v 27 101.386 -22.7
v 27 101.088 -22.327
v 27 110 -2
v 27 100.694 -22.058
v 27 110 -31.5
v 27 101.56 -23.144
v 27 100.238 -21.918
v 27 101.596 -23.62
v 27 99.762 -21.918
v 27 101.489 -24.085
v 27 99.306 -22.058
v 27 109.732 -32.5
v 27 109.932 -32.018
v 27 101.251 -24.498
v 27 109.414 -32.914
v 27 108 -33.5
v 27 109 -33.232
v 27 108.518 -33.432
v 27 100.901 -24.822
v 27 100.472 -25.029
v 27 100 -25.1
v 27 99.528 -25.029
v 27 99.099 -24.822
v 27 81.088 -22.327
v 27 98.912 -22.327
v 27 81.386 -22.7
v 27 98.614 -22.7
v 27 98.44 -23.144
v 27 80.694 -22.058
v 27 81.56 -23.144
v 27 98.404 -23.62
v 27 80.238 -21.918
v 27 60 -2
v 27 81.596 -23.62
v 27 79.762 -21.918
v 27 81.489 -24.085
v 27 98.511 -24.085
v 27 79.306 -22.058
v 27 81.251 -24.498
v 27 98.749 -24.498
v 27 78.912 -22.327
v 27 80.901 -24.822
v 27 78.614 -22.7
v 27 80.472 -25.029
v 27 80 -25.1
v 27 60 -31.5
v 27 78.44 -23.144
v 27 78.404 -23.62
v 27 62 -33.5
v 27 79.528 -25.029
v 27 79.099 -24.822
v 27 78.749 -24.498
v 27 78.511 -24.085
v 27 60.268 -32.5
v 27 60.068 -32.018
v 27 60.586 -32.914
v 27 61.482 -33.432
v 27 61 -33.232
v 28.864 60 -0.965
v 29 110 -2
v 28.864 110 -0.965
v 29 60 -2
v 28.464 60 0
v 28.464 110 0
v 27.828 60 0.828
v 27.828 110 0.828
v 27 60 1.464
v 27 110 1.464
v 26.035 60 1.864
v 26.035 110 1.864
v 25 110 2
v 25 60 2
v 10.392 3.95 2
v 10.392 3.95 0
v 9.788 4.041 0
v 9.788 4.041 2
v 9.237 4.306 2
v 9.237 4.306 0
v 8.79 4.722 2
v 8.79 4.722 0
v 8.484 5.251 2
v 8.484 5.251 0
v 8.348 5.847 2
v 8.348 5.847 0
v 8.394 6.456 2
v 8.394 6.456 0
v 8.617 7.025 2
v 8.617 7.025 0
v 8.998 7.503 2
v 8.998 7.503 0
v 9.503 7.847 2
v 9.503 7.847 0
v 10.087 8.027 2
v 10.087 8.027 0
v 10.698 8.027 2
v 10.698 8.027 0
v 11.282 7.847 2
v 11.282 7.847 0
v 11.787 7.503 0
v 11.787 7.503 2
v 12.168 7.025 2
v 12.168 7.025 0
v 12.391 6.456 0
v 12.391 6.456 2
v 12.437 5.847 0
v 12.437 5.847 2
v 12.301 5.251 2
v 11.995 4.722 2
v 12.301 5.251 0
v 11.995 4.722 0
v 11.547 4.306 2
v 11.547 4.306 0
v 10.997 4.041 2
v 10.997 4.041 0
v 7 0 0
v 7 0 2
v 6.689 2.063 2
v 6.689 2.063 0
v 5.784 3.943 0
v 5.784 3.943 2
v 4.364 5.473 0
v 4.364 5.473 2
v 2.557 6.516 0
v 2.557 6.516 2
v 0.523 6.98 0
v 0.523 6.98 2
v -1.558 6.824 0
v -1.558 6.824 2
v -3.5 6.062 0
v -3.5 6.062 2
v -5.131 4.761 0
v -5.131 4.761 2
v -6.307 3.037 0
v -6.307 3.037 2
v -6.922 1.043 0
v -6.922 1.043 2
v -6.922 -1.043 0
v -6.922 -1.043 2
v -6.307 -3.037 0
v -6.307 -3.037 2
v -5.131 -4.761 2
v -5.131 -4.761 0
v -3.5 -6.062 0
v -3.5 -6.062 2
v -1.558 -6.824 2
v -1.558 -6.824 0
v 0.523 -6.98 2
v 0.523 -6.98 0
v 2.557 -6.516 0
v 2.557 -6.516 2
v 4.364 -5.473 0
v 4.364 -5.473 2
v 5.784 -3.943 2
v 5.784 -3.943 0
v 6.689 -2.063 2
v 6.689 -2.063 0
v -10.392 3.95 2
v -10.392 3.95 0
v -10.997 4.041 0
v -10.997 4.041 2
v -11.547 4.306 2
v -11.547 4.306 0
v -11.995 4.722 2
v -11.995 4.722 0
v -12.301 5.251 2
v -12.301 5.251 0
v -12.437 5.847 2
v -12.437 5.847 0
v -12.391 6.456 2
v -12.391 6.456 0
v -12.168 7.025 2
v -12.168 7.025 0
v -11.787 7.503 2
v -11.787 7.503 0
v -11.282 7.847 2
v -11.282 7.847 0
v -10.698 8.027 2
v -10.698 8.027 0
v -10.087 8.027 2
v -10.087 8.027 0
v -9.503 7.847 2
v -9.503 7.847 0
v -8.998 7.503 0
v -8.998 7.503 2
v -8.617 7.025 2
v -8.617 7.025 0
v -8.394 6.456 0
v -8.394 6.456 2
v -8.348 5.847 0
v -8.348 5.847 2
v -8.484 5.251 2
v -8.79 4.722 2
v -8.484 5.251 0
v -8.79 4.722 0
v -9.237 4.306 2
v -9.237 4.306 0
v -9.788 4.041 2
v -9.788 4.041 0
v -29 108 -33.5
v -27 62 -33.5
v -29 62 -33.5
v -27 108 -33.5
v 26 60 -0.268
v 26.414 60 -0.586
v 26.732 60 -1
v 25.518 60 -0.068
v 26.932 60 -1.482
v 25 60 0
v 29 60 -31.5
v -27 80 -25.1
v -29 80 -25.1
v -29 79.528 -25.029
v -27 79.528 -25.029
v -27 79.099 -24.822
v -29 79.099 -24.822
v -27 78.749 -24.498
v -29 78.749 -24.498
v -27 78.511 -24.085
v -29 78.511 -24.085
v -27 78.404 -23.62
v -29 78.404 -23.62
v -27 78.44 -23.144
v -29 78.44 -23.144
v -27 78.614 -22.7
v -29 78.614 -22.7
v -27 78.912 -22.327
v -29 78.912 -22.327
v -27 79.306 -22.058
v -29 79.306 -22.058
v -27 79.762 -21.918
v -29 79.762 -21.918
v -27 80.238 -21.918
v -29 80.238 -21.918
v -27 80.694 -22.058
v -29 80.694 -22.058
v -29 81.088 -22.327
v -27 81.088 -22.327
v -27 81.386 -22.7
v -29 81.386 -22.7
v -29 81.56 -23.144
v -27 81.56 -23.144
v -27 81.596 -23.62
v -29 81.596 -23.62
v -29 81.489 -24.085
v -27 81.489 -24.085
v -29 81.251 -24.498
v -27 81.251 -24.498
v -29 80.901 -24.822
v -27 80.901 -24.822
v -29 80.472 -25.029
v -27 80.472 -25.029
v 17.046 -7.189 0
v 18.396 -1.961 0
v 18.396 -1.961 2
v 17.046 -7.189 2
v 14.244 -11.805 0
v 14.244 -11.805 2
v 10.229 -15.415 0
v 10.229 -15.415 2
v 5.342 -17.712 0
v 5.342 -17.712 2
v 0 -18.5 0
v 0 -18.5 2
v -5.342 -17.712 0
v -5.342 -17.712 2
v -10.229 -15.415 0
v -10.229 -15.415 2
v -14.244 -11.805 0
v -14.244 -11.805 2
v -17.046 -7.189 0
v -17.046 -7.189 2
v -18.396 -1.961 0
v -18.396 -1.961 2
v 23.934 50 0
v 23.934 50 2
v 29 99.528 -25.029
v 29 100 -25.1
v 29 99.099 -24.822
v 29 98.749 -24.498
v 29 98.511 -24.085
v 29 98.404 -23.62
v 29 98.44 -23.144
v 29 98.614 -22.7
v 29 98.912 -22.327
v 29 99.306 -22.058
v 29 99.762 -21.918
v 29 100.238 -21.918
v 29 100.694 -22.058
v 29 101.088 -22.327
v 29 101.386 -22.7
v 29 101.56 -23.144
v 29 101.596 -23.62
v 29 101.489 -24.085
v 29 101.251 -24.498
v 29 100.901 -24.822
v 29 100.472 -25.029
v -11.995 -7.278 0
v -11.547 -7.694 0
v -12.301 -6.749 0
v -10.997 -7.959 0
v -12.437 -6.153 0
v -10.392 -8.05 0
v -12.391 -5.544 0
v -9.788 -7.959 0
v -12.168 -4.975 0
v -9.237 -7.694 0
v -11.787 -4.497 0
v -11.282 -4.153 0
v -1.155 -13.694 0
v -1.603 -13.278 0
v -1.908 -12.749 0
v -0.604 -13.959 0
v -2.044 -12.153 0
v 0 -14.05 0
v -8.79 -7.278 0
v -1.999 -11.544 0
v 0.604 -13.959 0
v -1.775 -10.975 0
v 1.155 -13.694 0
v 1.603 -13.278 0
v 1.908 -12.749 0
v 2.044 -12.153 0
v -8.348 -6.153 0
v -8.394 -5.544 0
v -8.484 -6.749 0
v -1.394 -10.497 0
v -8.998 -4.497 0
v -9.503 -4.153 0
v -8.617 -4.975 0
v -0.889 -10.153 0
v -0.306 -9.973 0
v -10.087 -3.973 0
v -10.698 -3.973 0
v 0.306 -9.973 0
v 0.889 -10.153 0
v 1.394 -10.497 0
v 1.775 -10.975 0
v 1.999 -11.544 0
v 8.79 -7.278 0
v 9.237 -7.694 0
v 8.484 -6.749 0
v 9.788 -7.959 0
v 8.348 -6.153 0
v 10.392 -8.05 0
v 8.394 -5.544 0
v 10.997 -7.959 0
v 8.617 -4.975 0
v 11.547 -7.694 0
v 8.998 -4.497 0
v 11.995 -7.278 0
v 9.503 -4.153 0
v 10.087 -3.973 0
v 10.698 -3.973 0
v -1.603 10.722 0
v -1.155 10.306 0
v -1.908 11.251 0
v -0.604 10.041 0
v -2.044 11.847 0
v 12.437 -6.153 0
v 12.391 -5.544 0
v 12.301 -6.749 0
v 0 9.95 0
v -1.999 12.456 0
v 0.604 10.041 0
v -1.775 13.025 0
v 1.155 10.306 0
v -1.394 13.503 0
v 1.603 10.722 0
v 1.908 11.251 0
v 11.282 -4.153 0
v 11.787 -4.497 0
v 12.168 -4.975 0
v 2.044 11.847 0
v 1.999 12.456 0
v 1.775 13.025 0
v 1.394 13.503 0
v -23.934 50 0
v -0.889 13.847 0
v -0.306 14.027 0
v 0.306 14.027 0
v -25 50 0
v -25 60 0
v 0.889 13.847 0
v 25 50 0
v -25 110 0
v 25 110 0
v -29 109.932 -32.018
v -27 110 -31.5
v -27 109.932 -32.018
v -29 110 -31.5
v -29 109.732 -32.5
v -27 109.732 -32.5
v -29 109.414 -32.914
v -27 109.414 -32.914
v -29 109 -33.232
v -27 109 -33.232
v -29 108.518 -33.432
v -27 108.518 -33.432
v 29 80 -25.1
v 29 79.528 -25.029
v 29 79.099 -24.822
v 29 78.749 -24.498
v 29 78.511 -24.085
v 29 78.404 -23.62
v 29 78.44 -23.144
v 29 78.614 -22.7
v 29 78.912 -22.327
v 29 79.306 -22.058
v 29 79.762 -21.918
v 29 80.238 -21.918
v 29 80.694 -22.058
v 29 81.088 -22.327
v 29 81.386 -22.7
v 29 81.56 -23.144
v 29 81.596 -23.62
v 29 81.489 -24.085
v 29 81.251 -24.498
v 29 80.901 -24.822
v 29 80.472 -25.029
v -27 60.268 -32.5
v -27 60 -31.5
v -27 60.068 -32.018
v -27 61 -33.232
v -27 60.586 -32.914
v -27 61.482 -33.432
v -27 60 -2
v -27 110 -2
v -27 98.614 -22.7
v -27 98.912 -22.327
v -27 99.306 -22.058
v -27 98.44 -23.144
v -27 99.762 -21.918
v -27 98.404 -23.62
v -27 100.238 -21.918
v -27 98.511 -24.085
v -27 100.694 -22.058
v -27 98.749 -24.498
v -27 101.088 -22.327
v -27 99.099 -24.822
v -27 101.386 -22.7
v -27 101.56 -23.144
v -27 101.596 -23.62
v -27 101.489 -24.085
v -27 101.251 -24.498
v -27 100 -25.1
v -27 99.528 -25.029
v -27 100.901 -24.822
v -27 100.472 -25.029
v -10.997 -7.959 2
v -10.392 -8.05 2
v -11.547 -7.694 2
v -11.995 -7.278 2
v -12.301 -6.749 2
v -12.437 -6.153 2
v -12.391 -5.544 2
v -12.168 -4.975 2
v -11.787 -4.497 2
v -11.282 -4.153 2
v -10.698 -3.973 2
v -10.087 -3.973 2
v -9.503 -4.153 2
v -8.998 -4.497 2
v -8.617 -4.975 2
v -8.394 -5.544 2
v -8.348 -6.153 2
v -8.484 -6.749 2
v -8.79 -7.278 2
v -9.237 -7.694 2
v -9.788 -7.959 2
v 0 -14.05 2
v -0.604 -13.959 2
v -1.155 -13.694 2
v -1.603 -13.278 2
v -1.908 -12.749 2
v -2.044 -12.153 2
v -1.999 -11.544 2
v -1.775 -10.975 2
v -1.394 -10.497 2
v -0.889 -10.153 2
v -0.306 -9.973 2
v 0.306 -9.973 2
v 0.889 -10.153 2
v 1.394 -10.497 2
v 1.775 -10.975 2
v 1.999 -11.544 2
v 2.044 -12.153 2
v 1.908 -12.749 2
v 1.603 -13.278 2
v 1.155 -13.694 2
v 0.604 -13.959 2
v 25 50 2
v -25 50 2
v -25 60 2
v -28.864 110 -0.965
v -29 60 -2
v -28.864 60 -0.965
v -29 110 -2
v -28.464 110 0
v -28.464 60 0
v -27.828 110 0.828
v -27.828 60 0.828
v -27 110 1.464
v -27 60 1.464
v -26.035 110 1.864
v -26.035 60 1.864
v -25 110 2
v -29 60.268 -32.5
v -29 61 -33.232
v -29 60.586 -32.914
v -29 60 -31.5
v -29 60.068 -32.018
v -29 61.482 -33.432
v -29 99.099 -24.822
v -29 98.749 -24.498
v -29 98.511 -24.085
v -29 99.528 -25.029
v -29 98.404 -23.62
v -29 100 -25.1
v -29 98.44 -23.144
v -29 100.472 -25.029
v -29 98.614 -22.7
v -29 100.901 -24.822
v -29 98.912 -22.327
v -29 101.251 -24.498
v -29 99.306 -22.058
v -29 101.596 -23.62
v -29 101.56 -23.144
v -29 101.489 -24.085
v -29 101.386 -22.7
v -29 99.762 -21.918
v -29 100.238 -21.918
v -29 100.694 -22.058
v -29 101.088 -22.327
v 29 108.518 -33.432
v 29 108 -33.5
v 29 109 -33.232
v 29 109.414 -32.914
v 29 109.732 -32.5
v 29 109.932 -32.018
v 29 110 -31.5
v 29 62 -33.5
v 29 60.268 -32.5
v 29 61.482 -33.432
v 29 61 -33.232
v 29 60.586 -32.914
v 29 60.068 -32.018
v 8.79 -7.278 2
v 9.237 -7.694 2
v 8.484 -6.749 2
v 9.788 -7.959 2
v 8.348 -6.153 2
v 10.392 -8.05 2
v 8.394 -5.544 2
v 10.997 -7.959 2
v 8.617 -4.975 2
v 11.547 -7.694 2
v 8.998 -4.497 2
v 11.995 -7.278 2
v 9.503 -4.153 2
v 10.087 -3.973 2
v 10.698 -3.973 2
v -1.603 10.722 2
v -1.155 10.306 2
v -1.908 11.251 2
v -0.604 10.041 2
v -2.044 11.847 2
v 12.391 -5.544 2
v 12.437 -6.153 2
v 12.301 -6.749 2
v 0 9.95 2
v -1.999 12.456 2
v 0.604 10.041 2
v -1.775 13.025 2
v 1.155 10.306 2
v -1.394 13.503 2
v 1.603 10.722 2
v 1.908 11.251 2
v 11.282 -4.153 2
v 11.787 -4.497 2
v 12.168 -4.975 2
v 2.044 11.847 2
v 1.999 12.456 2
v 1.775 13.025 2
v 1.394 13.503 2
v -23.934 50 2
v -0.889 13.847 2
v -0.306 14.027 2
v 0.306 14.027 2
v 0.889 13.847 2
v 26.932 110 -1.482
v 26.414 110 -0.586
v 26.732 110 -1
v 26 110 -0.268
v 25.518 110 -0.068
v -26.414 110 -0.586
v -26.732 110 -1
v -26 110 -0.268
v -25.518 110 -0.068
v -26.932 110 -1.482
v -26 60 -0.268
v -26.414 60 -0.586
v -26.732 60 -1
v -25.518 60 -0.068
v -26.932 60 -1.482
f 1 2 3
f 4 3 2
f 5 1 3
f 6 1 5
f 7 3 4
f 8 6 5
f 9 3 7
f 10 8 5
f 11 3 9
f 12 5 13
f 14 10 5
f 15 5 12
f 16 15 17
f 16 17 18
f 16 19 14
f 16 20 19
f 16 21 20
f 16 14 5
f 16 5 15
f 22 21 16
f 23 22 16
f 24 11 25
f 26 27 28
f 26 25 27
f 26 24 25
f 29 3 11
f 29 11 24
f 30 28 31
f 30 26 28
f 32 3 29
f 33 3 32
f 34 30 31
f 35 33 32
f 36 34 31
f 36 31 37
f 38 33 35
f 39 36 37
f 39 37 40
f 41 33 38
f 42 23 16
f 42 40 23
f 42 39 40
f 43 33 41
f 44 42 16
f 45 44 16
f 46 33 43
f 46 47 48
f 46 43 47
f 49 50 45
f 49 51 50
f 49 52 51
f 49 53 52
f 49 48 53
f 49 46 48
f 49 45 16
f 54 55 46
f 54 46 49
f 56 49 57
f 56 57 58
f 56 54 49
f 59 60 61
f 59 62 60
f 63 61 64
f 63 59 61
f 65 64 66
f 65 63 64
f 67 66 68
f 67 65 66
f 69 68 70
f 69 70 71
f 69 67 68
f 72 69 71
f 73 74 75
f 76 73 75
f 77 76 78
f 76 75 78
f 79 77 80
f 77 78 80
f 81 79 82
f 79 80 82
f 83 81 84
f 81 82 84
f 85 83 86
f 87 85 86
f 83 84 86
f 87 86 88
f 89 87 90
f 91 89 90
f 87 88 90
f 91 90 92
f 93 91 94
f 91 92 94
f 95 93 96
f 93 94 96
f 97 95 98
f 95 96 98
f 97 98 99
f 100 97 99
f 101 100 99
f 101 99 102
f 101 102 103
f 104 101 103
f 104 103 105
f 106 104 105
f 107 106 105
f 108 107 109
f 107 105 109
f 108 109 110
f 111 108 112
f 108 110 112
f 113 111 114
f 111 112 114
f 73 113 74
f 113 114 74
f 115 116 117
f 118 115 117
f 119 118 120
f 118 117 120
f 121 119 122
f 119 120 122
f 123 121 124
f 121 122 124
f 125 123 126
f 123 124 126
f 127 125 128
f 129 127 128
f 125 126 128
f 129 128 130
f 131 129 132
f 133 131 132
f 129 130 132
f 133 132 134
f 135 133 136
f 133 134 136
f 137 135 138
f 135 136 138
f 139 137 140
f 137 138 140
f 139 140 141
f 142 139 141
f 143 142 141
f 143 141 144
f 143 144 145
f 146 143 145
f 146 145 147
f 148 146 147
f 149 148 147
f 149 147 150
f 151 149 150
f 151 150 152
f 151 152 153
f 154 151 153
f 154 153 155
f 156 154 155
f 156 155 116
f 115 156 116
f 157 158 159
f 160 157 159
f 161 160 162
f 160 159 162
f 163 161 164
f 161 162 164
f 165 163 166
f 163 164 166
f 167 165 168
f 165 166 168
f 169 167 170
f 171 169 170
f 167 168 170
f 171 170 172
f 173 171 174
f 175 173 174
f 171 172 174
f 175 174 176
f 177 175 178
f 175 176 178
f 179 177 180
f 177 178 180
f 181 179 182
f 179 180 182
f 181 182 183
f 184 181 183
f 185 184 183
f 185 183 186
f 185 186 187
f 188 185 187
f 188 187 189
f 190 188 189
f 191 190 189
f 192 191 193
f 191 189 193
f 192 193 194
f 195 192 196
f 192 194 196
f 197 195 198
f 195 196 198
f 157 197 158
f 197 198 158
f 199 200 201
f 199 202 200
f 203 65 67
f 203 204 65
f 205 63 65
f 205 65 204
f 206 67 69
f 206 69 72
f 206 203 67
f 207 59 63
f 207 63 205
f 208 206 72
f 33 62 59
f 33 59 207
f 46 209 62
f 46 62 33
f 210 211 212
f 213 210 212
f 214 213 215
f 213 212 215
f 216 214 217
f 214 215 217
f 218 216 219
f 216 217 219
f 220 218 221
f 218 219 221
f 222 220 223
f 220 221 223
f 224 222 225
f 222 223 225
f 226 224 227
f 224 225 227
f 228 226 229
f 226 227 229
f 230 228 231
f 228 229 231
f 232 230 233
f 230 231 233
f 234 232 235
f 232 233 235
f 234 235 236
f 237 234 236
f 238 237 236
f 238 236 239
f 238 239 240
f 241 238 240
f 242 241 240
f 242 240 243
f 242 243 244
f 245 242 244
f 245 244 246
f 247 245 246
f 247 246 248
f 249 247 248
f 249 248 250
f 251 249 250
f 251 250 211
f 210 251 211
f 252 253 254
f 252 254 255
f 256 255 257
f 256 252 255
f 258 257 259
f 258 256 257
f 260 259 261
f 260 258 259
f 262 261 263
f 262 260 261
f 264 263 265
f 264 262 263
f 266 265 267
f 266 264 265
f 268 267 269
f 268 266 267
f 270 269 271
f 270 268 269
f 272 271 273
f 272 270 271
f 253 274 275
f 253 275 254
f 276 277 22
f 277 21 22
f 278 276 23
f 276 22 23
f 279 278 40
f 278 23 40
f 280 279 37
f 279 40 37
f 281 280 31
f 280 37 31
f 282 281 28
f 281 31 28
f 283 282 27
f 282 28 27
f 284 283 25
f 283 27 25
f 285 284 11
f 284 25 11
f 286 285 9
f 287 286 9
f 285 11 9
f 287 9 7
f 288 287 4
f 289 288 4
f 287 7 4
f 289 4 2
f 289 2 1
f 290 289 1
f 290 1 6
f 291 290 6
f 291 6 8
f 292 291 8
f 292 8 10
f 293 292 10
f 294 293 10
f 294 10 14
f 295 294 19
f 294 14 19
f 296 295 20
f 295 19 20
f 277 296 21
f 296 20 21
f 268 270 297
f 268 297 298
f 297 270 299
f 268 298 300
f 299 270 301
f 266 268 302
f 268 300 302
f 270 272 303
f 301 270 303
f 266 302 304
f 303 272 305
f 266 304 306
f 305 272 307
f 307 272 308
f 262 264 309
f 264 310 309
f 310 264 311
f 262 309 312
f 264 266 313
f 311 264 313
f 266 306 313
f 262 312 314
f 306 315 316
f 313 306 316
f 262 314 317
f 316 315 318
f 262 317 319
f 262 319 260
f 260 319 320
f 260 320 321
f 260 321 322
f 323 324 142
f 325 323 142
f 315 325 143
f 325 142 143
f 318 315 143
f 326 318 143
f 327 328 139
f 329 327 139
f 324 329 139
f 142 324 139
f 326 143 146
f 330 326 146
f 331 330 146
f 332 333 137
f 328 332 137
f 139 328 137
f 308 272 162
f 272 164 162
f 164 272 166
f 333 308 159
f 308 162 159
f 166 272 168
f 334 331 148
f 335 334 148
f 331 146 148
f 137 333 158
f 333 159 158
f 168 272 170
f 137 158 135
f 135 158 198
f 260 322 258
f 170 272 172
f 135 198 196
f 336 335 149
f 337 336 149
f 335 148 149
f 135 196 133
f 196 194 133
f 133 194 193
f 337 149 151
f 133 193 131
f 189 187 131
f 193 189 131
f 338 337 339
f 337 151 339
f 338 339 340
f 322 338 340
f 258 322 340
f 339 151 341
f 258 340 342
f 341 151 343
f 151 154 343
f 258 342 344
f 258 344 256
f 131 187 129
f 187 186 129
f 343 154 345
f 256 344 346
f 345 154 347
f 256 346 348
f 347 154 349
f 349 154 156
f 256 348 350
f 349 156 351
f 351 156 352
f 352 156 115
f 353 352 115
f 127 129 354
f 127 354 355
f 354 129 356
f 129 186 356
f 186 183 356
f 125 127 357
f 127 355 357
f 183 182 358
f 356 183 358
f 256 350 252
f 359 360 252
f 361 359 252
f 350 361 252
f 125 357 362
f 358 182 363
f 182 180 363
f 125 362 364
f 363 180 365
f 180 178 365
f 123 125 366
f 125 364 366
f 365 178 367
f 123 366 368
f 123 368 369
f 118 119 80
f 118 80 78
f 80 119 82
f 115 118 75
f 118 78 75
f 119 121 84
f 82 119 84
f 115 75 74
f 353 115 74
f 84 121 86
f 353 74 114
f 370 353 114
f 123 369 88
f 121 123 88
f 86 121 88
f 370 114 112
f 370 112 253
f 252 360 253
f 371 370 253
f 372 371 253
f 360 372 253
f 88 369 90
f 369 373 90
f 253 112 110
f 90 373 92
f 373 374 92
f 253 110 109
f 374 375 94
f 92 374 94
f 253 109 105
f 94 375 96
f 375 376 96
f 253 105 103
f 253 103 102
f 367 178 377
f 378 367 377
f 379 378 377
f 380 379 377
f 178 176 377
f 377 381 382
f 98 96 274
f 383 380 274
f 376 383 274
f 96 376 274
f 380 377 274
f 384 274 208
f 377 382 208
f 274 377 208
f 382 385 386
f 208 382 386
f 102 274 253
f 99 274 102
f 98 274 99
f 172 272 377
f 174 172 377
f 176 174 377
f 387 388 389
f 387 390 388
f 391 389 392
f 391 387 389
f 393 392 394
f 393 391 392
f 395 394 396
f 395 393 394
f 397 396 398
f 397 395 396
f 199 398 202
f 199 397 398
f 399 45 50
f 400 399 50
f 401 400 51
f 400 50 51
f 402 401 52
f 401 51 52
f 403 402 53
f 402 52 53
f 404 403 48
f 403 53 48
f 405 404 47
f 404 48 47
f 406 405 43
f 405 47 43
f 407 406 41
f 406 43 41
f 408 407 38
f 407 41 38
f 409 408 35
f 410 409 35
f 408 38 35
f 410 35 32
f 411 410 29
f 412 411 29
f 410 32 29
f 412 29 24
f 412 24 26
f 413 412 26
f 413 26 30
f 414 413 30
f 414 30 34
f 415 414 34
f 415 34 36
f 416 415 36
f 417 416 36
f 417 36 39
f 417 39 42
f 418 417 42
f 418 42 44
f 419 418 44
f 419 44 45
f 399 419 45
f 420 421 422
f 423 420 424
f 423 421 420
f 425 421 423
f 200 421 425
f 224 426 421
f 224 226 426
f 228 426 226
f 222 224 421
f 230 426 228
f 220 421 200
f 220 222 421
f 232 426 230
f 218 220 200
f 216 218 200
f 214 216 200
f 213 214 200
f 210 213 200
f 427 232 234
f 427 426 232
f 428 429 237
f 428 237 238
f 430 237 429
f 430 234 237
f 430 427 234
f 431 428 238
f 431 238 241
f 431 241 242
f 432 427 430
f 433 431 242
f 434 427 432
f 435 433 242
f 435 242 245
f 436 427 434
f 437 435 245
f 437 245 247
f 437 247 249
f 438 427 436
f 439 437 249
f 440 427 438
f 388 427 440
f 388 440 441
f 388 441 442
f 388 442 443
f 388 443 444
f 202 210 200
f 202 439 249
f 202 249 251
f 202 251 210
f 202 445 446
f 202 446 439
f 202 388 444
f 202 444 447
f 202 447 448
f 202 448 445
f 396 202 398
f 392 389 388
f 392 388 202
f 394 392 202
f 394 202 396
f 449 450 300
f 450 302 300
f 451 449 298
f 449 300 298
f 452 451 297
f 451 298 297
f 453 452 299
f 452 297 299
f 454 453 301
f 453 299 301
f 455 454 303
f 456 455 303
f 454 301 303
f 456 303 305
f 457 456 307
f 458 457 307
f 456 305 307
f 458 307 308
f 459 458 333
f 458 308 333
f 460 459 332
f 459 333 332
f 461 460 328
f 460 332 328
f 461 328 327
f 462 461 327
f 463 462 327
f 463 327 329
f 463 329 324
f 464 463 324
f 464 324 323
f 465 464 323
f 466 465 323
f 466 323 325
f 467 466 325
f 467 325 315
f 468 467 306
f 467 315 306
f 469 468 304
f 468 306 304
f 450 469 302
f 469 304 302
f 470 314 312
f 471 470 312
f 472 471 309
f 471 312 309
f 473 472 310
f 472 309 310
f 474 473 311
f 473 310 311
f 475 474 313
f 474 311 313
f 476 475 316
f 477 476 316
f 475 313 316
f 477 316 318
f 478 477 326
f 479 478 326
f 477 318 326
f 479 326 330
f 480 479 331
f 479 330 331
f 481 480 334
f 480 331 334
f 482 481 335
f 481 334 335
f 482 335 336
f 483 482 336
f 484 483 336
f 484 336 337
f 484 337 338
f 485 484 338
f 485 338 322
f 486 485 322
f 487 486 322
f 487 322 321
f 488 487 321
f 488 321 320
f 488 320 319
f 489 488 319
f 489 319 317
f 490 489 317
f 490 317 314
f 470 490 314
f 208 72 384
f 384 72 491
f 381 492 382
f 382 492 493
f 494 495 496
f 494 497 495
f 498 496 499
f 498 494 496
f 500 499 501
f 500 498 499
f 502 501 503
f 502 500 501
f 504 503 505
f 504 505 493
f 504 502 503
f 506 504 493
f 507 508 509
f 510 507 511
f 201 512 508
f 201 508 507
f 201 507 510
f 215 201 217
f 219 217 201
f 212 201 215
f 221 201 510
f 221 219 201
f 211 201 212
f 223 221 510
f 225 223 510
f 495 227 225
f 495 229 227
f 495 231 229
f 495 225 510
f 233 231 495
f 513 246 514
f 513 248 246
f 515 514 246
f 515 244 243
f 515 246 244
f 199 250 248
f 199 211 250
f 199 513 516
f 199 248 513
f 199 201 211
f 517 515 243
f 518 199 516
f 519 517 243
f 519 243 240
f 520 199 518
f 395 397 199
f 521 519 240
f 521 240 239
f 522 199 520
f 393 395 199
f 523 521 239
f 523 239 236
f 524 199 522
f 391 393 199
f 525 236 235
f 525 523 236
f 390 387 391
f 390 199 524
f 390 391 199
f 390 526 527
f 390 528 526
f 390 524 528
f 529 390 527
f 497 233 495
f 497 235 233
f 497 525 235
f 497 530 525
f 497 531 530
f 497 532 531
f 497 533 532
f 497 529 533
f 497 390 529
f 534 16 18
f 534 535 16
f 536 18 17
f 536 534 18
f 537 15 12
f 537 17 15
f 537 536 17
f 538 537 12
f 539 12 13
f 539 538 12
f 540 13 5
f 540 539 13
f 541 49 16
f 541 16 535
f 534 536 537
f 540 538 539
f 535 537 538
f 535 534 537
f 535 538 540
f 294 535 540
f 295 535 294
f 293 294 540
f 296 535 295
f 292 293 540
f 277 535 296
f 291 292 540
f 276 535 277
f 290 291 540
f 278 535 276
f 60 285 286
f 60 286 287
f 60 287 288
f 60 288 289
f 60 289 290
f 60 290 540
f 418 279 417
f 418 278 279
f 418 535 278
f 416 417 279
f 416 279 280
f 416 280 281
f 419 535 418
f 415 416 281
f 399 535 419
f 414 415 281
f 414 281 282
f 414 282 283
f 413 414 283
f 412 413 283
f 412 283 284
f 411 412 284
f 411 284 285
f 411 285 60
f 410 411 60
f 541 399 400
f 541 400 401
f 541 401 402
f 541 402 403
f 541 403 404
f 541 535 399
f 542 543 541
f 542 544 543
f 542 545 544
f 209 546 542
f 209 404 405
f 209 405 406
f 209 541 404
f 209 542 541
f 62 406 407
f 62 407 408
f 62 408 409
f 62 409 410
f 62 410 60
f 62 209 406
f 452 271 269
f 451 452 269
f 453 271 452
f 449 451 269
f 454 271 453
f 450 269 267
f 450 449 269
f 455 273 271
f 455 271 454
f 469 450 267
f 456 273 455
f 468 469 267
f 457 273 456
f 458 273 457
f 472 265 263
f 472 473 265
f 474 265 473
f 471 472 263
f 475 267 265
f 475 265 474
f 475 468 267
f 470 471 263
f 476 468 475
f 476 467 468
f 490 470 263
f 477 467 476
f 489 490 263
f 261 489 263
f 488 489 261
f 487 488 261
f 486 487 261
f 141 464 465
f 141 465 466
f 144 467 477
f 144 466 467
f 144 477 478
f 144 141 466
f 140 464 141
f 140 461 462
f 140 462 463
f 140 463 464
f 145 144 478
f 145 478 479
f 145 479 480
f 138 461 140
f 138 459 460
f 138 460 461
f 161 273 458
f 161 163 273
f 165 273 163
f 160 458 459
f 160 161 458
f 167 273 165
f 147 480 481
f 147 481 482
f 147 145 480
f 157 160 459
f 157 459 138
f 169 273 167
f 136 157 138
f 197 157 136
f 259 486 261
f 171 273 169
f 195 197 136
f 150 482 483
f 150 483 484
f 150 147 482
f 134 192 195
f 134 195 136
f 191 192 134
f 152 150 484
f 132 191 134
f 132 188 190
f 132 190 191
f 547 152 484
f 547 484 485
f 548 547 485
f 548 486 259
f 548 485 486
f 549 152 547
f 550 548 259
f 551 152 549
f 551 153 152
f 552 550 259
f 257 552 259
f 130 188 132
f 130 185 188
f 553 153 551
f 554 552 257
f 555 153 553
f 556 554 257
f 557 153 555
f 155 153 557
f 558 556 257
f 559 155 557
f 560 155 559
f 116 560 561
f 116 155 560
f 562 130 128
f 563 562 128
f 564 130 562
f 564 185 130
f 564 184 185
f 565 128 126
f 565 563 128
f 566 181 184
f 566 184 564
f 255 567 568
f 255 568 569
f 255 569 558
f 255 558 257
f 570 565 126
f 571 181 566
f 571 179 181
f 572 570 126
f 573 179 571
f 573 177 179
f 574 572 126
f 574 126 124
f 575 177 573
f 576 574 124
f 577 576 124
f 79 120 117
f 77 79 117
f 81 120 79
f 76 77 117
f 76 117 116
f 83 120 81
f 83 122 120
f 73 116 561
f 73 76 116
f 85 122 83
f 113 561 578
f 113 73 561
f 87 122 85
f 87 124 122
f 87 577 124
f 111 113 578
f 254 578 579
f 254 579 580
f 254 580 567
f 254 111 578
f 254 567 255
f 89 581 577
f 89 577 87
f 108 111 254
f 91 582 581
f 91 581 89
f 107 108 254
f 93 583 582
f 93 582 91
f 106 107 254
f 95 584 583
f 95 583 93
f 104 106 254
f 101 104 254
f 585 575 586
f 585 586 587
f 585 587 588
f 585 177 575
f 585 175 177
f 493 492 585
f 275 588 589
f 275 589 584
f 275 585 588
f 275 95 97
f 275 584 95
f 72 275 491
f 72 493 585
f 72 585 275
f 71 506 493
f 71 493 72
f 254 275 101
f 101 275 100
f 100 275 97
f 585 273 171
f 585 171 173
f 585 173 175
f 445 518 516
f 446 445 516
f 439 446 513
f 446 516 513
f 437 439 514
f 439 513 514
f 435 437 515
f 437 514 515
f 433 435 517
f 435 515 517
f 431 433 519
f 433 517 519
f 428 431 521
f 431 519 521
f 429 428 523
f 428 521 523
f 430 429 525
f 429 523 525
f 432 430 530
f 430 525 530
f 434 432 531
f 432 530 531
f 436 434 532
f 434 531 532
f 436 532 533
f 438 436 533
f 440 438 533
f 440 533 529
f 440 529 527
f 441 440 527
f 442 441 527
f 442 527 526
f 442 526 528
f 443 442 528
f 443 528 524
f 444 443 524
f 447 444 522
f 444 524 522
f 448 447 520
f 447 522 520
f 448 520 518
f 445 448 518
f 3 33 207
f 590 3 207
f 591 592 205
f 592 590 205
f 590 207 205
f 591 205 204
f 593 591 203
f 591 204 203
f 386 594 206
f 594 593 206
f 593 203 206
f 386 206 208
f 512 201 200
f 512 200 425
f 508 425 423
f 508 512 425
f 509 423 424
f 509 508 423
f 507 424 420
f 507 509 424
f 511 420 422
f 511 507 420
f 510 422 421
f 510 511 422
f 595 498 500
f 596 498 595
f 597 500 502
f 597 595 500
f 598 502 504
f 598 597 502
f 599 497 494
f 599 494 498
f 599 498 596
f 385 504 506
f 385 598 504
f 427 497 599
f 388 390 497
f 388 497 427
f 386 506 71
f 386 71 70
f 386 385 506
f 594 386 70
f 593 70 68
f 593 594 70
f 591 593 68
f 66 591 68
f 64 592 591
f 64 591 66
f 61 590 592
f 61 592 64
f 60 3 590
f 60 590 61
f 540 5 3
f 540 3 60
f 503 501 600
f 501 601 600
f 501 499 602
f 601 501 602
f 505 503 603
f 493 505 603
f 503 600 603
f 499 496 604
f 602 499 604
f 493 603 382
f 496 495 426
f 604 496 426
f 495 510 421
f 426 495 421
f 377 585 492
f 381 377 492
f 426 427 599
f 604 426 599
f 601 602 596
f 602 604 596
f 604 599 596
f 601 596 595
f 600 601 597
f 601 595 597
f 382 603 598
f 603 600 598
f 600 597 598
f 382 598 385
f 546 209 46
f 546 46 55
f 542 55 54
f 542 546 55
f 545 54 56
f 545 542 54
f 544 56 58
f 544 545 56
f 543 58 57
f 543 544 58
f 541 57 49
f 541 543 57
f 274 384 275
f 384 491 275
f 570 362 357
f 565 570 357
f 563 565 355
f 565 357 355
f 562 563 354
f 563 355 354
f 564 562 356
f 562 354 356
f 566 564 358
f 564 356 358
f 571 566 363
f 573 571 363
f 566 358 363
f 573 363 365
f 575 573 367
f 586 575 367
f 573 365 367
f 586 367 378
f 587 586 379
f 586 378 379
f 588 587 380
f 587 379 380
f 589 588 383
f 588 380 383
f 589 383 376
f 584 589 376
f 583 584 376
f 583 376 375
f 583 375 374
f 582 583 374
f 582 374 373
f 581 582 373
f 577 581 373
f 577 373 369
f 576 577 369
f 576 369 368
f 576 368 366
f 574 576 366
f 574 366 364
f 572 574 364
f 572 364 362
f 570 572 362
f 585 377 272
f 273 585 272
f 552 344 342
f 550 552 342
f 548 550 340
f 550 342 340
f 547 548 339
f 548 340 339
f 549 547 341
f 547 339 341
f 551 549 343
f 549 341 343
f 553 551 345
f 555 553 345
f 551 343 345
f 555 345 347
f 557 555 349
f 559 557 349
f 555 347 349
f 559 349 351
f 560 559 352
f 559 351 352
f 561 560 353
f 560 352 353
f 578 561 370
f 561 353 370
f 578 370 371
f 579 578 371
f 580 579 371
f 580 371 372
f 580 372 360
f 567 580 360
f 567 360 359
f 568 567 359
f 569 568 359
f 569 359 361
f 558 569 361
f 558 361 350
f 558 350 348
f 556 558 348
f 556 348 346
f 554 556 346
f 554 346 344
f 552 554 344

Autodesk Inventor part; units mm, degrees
ref_plane "YZ Plane" through (0, 0, 0) normal (1, 0, 0) x (0, 1, 0)
ref_plane "XZ Plane" through (0, 0, 0) normal (0, 1, 0) x (-1, 0, 0)
ref_plane "XY Plane" through (0, 0, 0) normal (0, 0, 1) x (1, 0, 0)
sketch "スケッチ1" plane through (0, 0, 0) normal (0, 0, 1) x (1, 0, 0)
  circle A0 centre (0, 0) radius 18.5
  line L0 (0, 0) -> (0, 60)
  line L1 (0, 60) -> (25, 60)
  line L2 (25, 60) -> (25, 110)
  line L3 (25, 110) -> (0, 110)
  line L4 (0, 110) -> (0, 60)
  line L5 (25, 60) -> (18.3958, -1.9608)
  line L6 (0, 60) -> (-25, 60)
  line L7 (-25, 60) -> (-25, 110)
  line L8 (-25, 110) -> (0, 110)
  line L9 (-25, 60) -> (-18.3958, -1.9608)
  point P0 (-18.3958, -1.9608)
  dimension "d0" = 37
  dimension "d1" = 60
  dimension "d2" = 50
  dimension "d3" = 25
extrude "プレート1" add sketch "スケッチ1" along normal blind 2
sketch "スケッチ2" plane through (27, 60, -2) normal (1, 0, 0) x (0, 1, 0)
  line L0 (50, 0) -> (0, 0)
  line L1 (0, 0) -> (0, -31.5)
  line L2 (0, -31.5) -> (50, -31.5)
  line L3 (50, -31.5) -> (50, 0)
edge flange "フランジ1" height 35.5 angle 90 thickness 2 bend radius 2 thickness toward (1, 0, 0) relief tear relief width 2 relief depth 1 edges at (25, 85, 0) wall of the first edge with corners at (27, 110, -2) (27, 60, -2) (27, 60, -33.5) (27, 110, -33.5)
bend "曲げ1"
corner "コーナー1"
sketch "スケッチ3" plane through (-27, 110, -2) normal (-1, 0, 0) x (0, -1, 0)
  line L0 (50, 0) -> (0, 0)
  line L1 (0, 0) -> (0, -31.5)
  line L2 (0, -31.5) -> (50, -31.5)
  line L3 (50, -31.5) -> (50, 0)
edge flange "フランジ2" height 35.5 angle 90 thickness 2 bend radius 2 thickness toward (-1, 0, 0) relief tear relief width 2 relief depth 1 edges at (-25, 85, 0) wall of the first edge with corners at (-27, 60, -2) (-27, 110, -2) (-27, 110, -33.5) (-27, 60, -33.5)
bend "曲げ2"
corner "コーナー2"
sketch "スケッチ4" plane through (0, 0, 2) normal (0, 0, 1) x (1, 0, 0)
  circle A0 centre (0, 0) radius 7
  dimension "d25" = 14
extrude "押し出し1" cut sketch "スケッチ4" against normal blind 10
sketch "スケッチ5" plane through (0, 0, 2) normal (0, 0, 1) x (1, 0, 0)
  circle A0 centre (0, 0) radius 12
  point P0 (0, 12)
  point P1 (-10.3923, 6)
  point P2 (-10.3923, -6)
  point P3 (0, -12)
  point P4 (10.3923, -6)
  point P5 (10.3923, 6)
  dimension "d28" = 24
  dimension "d31" = 360
hole "穴1" at (0, 12, 2) at (-10.3923, 6, 2) at (-10.3923, -6, 2) at (0, -12, 2) at (10.3923, -6, 2) at (10.3923, 6, 2) direction (0, 0, -1) diameter 4.1 end through all
sketch "スケッチ6" plane through (29, 60, -33.5) normal (1, 0, 0) x (0, 0, -1)
  line L0 (0, 0) -> (0, 50) projected
  line L1 (0, 10) -> (-31.5, 10)
  line L2 (-31.5, 50) -> (-31.5, 0) projected
  line L3 (0, 0) -> (-31.5, 0) projected
  line L4 (0, 50) -> (-31.5, 50) projected
  line L5 (-10, 50) -> (-10, 10)
  point P0 (-33.5, -60)
  point P1 (-10, 20)
  point P2 (-10, 40)
  point P3 (-33.5, 50)
  dimension "d40" = 10
  dimension "d42" = 10
  dimension "d43" = 20
  dimension "d62" = 23.5
hole "穴2" at (29, 80, -23.5) at (29, 100, -23.5) direction (-1, 0, 0) diameter 3.2 end through all
sketch "スケッチ7" plane through (0, 0, 2) normal (0, 0, 1) x (1, 0, 0)
  line L0 (-15, 100) -> (15, 100)
  line L1 (15, 100) -> (15, 60)
  line L2 (15, 60) -> (-15, 60)
  line L3 (-15, 60) -> (-15, 100)
  line L4 (-25, 110) -> (25, 110) projected
  line L5 (-25, 60) -> (-25, 110) projected
  line L6 (25, 110) -> (25, 60) projected
  circle A0 centre (0, 0) radius 7 projected
  circle A1 centre (0, 0) radius 8.5
  line L7 (-8.4521, -0.9009) -> (-13.8775, 50)
  line L8 (-18.3958, -1.9608) -> (-25, 60) projected
  line L9 (8.4521, -0.9009) -> (13.8775, 50)
  line L10 (25, 60) -> (18.3958, -1.9608) projected
  line L11 (-13.8775, 50) -> (13.8775, 50)
  line L12 (-10.6799, 20) -> (10.6799, 20)
  dimension "d51" = 10
  dimension "d52" = 10
  dimension "d53" = 10
  dimension "d54" = 40
  dimension "d55" = 10
  dimension "d56" = 10
  dimension "d57" = 20
extrude "押し出し2" [suppressed]
fillet "フィレット1" [suppressed]
fillet "フィレット2" radius 2 4 edges at (-28, 60, -33.5) (-28, 110, -33.5) (28, 60, -33.5) (28, 110, -33.5)
sketch "スケッチ8" plane through (0, 0, 2) normal (0, 0, 1) x (1, 0, 0)
  line L0 (-25, 110) -> (-25, 60) projected
  line L1 (-25, 60) -> (25, 60)
  line L2 (25, 60) -> (25, 50)
  line L3 (25, 50) -> (-25, 50)
  line L4 (-25, 50) -> (-25, 60)
  point P0 (0, 0)
  dimension "d63" = 10
extrude "押し出し3" add sketch "スケッチ8" against normal blind 2
equation "\"d38\" = Thickness"
equation "\"d4\" = Thickness"
equation "\"d5\" = BendReliefWidth"
equation "\"d6\" = BendReliefDepth"
equation "\"d7\" = MinimumRemnant"
equation "\"d8\" = TransitionRadius"
equation "\"d11\" = BendRadius"
equation "\"d12\" = CornerReliefSize"
equation "\"d13\" = GapSize"
equation "\"d14\" = JacobiRadiusSize"
equation "\"d15\" = BendReliefWidth"
equation "\"d16\" = BendReliefDepth"
equation "\"d17\" = MinimumRemnant"
equation "\"d18\" = TransitionRadius"
equation "\"d21\" = BendRadius"
equation "\"d22\" = CornerReliefSize"
equation "\"d23\" = GapSize"
equation "\"d24\" = JacobiRadiusSize"
equation "\"BendRadius\" = Thickness"
equation "\"BendReliefWidth\" = Thickness"
equation "\"BendReliefDepth\" = 0.5 * Thickness"
equation "\"CornerReliefSize\" = 4 * Thickness"
equation "\"MinimumRemnant\" = 2 * Thickness"
equation "\"TransitionRadius\" = BendRadius"
equation "\"JacobiRadiusSize\" = BendRadius"
equation "\"GapSize\" = Thickness"
equation "\"Thickness\" = 2"
properties part number "servoplate1_forR6" material "アルミニウム 6061"
